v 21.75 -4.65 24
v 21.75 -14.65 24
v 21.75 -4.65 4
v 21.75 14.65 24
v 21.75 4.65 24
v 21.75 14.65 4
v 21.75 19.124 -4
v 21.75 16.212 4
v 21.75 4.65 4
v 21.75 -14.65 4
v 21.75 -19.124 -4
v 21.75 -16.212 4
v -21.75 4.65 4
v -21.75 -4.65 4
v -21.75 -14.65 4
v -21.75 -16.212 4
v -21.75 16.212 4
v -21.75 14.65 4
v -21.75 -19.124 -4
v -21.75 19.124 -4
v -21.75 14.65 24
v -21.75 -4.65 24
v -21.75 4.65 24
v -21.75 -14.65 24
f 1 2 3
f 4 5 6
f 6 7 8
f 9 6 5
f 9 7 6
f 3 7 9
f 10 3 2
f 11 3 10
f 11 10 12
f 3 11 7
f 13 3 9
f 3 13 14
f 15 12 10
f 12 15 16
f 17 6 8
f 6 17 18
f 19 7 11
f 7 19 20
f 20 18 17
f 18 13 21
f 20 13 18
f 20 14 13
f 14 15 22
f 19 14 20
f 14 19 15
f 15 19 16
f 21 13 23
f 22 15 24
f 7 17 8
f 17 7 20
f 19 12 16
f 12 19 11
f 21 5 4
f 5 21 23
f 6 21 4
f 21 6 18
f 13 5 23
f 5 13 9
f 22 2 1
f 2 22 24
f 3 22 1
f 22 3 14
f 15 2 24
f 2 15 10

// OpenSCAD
// All measurements are in mm.

// The thickness of the phone. This should be the only value you need to change.
phone = 9.3;

// The thickness of the holder walls.
wall_thickness = 10;

// The height of the holder walls.
wall_height = 20;

// The width of the locking block.
width = 43.5;

// The depth of the locking block.
depth = 38.25;

// The height of the locking block.
height = 8.0;

union() {
    difference() {
        cube([width, depth, height], true);
        translate([0, depth / 2 + height / 2 - 1.2, 0])
            rotate([110, 0, 0])
            cube([width + 1, depth, height], true);
        translate([0, - depth / 2 - height / 2 + 1.2, 0])
            rotate([70, 0, 0])
            cube([width + 1, depth, height], true);
    }
    translate([-width / 2, phone / 2 , height / 2])
        cube([width, wall_thickness, wall_height]);
    translate([-width / 2, -wall_thickness - phone / 2, height / 2])
        cube([width, wall_thickness, wall_height]);
}
